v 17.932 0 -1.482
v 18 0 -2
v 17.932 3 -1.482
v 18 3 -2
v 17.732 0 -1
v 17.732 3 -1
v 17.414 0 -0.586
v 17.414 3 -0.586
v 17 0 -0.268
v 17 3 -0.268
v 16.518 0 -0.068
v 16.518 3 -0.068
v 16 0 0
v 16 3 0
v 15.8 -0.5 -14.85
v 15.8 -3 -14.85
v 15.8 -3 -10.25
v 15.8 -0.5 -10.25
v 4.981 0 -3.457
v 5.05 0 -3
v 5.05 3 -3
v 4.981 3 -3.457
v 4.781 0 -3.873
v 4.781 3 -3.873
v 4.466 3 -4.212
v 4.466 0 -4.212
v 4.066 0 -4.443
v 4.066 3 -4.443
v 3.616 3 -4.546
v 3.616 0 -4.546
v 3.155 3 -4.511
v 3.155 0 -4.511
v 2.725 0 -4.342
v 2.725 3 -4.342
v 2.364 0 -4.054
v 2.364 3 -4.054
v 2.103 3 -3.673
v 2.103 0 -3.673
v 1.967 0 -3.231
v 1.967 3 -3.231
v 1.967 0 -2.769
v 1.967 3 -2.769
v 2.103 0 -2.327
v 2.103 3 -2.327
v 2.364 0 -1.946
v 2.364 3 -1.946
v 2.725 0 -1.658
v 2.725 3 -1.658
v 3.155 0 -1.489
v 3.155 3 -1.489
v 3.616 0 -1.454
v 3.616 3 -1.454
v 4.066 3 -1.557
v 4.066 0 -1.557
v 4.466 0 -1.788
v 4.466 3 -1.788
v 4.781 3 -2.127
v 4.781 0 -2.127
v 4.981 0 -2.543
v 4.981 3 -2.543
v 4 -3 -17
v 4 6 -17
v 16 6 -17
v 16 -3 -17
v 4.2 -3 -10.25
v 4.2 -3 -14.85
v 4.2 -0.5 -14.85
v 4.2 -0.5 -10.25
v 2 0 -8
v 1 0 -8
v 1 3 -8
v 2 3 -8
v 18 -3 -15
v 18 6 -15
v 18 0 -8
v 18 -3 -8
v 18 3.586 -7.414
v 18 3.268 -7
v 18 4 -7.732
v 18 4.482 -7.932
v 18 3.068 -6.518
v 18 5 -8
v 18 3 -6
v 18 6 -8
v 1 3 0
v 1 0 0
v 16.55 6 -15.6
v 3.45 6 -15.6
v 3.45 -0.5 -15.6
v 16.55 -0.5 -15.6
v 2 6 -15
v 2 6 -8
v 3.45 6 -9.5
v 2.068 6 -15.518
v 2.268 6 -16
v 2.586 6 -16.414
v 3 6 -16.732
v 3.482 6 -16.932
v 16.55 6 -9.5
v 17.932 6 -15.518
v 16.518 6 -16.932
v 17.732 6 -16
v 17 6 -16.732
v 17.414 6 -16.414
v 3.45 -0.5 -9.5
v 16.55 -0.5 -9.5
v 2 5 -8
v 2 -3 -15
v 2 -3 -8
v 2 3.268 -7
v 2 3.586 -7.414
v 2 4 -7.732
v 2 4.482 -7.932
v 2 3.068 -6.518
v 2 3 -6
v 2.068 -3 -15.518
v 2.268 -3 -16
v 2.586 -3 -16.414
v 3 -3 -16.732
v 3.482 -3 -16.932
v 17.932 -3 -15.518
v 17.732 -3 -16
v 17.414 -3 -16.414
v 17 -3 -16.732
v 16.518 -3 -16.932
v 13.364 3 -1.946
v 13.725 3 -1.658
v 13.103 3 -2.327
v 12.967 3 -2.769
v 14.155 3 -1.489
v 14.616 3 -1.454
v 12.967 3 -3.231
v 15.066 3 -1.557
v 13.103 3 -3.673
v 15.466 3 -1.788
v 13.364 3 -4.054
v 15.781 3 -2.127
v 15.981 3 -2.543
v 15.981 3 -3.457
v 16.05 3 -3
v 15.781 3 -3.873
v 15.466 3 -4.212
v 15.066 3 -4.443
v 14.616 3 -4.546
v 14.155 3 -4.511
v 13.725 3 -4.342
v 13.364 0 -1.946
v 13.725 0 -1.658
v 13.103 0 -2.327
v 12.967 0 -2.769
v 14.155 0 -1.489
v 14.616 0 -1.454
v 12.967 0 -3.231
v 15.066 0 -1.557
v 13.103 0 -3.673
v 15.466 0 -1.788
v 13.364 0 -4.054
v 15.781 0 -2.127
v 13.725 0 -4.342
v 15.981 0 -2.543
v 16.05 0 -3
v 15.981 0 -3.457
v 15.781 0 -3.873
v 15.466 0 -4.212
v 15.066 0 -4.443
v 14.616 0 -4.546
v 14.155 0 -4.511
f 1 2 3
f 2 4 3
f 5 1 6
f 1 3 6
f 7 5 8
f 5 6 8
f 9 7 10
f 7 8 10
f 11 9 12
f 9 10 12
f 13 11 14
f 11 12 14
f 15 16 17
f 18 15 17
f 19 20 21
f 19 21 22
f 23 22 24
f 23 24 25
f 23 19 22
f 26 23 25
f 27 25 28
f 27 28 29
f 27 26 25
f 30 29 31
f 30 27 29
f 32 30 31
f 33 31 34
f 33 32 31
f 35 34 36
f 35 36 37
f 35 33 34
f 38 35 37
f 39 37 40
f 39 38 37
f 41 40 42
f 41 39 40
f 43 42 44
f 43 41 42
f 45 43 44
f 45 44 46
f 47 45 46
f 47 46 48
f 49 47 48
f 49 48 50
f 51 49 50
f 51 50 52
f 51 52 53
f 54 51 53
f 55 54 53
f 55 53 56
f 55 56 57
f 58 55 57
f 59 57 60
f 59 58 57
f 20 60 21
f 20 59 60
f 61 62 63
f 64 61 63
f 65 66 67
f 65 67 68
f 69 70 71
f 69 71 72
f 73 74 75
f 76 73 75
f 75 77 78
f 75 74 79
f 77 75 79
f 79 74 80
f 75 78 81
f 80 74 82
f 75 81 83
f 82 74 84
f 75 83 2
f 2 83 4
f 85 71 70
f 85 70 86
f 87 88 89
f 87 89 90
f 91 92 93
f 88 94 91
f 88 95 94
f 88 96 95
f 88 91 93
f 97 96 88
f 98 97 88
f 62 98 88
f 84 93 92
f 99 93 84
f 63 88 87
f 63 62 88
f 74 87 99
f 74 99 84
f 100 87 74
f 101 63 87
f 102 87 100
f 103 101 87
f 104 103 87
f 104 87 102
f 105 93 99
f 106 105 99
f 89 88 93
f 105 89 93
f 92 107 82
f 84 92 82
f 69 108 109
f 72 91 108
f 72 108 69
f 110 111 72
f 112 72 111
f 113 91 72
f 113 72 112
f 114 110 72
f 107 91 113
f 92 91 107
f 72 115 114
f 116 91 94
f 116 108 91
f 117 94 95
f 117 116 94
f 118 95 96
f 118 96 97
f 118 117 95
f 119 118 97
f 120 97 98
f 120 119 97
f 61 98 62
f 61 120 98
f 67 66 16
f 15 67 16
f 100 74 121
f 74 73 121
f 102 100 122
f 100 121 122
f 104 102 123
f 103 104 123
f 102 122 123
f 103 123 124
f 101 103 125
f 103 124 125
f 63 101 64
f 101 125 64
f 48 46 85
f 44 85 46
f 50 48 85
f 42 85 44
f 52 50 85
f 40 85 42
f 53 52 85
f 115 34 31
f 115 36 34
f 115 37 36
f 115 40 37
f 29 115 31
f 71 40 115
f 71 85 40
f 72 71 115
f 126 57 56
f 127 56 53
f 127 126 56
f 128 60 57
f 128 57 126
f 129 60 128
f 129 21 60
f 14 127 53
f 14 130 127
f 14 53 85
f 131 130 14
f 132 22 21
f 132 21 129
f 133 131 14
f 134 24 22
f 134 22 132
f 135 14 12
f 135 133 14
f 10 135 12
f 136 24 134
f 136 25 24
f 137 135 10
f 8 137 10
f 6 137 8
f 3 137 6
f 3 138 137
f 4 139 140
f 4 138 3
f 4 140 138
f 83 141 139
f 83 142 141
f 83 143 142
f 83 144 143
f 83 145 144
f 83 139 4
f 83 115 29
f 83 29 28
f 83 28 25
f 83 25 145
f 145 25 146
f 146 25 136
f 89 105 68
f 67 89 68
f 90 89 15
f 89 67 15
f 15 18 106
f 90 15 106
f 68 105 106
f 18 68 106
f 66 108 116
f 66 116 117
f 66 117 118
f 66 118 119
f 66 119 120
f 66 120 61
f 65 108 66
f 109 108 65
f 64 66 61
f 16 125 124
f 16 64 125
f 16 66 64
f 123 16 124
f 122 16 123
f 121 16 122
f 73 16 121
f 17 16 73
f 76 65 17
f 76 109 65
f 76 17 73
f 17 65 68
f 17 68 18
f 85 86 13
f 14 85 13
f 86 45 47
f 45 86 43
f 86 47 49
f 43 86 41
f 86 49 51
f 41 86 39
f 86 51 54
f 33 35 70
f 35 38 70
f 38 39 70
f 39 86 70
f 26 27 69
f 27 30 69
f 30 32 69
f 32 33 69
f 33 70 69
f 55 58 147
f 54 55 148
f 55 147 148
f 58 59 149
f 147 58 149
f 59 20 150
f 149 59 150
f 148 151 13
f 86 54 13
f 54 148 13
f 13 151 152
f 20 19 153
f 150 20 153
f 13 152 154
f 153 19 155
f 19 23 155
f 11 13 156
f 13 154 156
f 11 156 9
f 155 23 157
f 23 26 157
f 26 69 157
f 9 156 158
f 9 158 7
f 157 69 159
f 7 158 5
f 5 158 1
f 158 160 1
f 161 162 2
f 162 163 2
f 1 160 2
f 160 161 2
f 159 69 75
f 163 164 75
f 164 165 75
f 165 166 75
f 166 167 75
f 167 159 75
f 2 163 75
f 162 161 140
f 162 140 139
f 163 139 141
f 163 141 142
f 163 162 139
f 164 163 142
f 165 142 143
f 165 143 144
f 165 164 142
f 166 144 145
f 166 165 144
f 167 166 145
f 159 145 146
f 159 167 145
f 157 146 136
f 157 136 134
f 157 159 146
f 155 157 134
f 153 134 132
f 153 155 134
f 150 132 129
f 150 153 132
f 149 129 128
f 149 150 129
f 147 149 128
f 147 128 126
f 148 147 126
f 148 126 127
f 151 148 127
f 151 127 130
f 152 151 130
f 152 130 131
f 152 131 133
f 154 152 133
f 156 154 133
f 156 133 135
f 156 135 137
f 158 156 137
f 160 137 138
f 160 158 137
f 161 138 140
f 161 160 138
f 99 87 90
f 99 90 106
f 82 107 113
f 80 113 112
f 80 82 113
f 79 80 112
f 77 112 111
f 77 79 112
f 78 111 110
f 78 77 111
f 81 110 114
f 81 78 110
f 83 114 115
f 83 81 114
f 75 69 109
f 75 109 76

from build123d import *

# Parameters (mm, degrees)
CROQUIS1_W              = 18
CROQUIS1_H              = 18
CROQUIS1_R              = 1.55
SALIENTE_EXTRUIR1_DEPTH = 3
CROQUIS3_W              = 18
CROQUIS3_H              = 10
SALIENTE_EXTRUIR3_DEPTH = 3
CROQUIS4_W              = 2
CROQUIS4_H              = 10
CORTAR_EXTRUIR1_DEPTH   = 6
CROQUIS7_W              = 13.1
CROQUIS7_H              = 6.1
CORTAR_EXTRUIR2_DEPTH   = 6
CROQUIS9_W              = 16
CROQUIS9_H              = 10
CROQUIS9_W_2            = 13.1
CROQUIS9_H_2            = 6.1
SALIENTE_EXTRUIR4_DEPTH = 3
CROQUIS10_W             = 13.1
CROQUIS10_H             = 6.1
CROQUIS10_W_2           = 11.6
CROQUIS10_H_2           = 4.6
SALIENTE_EXTRUIR6_DEPTH = 2.5
CROQUIS11_W             = 16
CROQUIS11_H             = 1
CORTAR_EXTRUIR4_DEPTH   = 9
REDONDEO1_R             = 2
CROQUIS12_W             = 8
CROQUIS12_H             = 3
CORTAR_EXTRUIR5_DEPTH   = 1
REDONDEO2_R             = 2


with BuildPart() as part:
    # Croquis1 → Saliente-Extruir1 (new body)
    with BuildSketch(Plane(origin=(0, 0, 0), x_dir=(1, 0, 0), z_dir=(0, 1, 0))):
        with Locations((9, 9)):
            Rectangle(CROQUIS1_W, CROQUIS1_H)
        with Locations((3.5, 3)):
            Circle(CROQUIS1_R, mode=Mode.SUBTRACT)
        with Locations((14.5, 3)):
            Circle(CROQUIS1_R, mode=Mode.SUBTRACT)
    extrude(amount=SALIENTE_EXTRUIR1_DEPTH)

    # Croquis3 → Saliente-Extruir3 (add)
    with BuildSketch(Plane(origin=(0, 3, 0), x_dir=(1, 0, 0), z_dir=(0, 1, 0))):
        with Locations((9, 13)):
            Rectangle(CROQUIS3_W, CROQUIS3_H)
    extrude(amount=SALIENTE_EXTRUIR3_DEPTH)

    # Croquis4 → Cortar-Extruir1 (cut)
    with BuildSketch(Plane.XZ):
        with Locations((1, -13)):
            Rectangle(CROQUIS4_W, CROQUIS4_H)
    extrude(amount=-CORTAR_EXTRUIR1_DEPTH, mode=Mode.SUBTRACT)

    # Croquis7 → Cortar-Extruir2 (cut)
    with BuildSketch(Plane(origin=(0, 6, 0), x_dir=(1, 0, 0), z_dir=(0, 1, 0))):
        with Locations((10, 12.55)):
            Rectangle(CROQUIS7_W, CROQUIS7_H)
    extrude(amount=-CORTAR_EXTRUIR2_DEPTH, mode=Mode.SUBTRACT)

    # Croquis9 → Saliente-Extruir4 (add)
    with BuildSketch(Plane.XZ):
        with Locations((10, -13)):
            Rectangle(CROQUIS9_W, CROQUIS9_H)
        with Locations((10, -12.55)):
            Rectangle(CROQUIS9_W_2, CROQUIS9_H_2, mode=Mode.SUBTRACT)
    extrude(amount=SALIENTE_EXTRUIR4_DEPTH)

    # Croquis10 → Saliente-Extruir6 (add)
    with BuildSketch(Plane.XZ.offset(3)):
        with Locations((10, -12.55)):
            Rectangle(CROQUIS10_W, CROQUIS10_H)
        with Locations((10, -12.55)):
            Rectangle(CROQUIS10_W_2, CROQUIS10_H_2, mode=Mode.SUBTRACT)
    extrude(amount=-SALIENTE_EXTRUIR6_DEPTH)

    # Croquis11 → Cortar-Extruir4 (cut)
    with BuildSketch(Plane(origin=(0, 6, 0), x_dir=(1, 0, 0), z_dir=(0, 1, 0))):
        with Locations((10, 17.5)):
            Rectangle(CROQUIS11_W, CROQUIS11_H)
    extrude(amount=-CORTAR_EXTRUIR4_DEPTH, mode=Mode.SUBTRACT)

    # Redondeo1
    redondeo1_edges = [part.edges().sort_by_distance(p)[0] for p in [
        (18, 1.5, -17),
        (2, 1.5, -17),
        (18, 1.5, 0),
    ]]
    fillet(redondeo1_edges, radius=REDONDEO1_R)

    # Croquis12 → Cortar-Extruir5 (cut)
    with BuildSketch(Plane.ZY):
        with Locations((-4, 1.5)):
            Rectangle(CROQUIS12_W, CROQUIS12_H)
    extrude(amount=-CORTAR_EXTRUIR5_DEPTH, mode=Mode.SUBTRACT)

    # Redondeo2
    redondeo2_edges = [part.edges().sort_by_distance(p)[0] for p in [
        (10, 3, -8),
    ]]
    fillet(redondeo2_edges, radius=REDONDEO2_R)


solid = part.part
